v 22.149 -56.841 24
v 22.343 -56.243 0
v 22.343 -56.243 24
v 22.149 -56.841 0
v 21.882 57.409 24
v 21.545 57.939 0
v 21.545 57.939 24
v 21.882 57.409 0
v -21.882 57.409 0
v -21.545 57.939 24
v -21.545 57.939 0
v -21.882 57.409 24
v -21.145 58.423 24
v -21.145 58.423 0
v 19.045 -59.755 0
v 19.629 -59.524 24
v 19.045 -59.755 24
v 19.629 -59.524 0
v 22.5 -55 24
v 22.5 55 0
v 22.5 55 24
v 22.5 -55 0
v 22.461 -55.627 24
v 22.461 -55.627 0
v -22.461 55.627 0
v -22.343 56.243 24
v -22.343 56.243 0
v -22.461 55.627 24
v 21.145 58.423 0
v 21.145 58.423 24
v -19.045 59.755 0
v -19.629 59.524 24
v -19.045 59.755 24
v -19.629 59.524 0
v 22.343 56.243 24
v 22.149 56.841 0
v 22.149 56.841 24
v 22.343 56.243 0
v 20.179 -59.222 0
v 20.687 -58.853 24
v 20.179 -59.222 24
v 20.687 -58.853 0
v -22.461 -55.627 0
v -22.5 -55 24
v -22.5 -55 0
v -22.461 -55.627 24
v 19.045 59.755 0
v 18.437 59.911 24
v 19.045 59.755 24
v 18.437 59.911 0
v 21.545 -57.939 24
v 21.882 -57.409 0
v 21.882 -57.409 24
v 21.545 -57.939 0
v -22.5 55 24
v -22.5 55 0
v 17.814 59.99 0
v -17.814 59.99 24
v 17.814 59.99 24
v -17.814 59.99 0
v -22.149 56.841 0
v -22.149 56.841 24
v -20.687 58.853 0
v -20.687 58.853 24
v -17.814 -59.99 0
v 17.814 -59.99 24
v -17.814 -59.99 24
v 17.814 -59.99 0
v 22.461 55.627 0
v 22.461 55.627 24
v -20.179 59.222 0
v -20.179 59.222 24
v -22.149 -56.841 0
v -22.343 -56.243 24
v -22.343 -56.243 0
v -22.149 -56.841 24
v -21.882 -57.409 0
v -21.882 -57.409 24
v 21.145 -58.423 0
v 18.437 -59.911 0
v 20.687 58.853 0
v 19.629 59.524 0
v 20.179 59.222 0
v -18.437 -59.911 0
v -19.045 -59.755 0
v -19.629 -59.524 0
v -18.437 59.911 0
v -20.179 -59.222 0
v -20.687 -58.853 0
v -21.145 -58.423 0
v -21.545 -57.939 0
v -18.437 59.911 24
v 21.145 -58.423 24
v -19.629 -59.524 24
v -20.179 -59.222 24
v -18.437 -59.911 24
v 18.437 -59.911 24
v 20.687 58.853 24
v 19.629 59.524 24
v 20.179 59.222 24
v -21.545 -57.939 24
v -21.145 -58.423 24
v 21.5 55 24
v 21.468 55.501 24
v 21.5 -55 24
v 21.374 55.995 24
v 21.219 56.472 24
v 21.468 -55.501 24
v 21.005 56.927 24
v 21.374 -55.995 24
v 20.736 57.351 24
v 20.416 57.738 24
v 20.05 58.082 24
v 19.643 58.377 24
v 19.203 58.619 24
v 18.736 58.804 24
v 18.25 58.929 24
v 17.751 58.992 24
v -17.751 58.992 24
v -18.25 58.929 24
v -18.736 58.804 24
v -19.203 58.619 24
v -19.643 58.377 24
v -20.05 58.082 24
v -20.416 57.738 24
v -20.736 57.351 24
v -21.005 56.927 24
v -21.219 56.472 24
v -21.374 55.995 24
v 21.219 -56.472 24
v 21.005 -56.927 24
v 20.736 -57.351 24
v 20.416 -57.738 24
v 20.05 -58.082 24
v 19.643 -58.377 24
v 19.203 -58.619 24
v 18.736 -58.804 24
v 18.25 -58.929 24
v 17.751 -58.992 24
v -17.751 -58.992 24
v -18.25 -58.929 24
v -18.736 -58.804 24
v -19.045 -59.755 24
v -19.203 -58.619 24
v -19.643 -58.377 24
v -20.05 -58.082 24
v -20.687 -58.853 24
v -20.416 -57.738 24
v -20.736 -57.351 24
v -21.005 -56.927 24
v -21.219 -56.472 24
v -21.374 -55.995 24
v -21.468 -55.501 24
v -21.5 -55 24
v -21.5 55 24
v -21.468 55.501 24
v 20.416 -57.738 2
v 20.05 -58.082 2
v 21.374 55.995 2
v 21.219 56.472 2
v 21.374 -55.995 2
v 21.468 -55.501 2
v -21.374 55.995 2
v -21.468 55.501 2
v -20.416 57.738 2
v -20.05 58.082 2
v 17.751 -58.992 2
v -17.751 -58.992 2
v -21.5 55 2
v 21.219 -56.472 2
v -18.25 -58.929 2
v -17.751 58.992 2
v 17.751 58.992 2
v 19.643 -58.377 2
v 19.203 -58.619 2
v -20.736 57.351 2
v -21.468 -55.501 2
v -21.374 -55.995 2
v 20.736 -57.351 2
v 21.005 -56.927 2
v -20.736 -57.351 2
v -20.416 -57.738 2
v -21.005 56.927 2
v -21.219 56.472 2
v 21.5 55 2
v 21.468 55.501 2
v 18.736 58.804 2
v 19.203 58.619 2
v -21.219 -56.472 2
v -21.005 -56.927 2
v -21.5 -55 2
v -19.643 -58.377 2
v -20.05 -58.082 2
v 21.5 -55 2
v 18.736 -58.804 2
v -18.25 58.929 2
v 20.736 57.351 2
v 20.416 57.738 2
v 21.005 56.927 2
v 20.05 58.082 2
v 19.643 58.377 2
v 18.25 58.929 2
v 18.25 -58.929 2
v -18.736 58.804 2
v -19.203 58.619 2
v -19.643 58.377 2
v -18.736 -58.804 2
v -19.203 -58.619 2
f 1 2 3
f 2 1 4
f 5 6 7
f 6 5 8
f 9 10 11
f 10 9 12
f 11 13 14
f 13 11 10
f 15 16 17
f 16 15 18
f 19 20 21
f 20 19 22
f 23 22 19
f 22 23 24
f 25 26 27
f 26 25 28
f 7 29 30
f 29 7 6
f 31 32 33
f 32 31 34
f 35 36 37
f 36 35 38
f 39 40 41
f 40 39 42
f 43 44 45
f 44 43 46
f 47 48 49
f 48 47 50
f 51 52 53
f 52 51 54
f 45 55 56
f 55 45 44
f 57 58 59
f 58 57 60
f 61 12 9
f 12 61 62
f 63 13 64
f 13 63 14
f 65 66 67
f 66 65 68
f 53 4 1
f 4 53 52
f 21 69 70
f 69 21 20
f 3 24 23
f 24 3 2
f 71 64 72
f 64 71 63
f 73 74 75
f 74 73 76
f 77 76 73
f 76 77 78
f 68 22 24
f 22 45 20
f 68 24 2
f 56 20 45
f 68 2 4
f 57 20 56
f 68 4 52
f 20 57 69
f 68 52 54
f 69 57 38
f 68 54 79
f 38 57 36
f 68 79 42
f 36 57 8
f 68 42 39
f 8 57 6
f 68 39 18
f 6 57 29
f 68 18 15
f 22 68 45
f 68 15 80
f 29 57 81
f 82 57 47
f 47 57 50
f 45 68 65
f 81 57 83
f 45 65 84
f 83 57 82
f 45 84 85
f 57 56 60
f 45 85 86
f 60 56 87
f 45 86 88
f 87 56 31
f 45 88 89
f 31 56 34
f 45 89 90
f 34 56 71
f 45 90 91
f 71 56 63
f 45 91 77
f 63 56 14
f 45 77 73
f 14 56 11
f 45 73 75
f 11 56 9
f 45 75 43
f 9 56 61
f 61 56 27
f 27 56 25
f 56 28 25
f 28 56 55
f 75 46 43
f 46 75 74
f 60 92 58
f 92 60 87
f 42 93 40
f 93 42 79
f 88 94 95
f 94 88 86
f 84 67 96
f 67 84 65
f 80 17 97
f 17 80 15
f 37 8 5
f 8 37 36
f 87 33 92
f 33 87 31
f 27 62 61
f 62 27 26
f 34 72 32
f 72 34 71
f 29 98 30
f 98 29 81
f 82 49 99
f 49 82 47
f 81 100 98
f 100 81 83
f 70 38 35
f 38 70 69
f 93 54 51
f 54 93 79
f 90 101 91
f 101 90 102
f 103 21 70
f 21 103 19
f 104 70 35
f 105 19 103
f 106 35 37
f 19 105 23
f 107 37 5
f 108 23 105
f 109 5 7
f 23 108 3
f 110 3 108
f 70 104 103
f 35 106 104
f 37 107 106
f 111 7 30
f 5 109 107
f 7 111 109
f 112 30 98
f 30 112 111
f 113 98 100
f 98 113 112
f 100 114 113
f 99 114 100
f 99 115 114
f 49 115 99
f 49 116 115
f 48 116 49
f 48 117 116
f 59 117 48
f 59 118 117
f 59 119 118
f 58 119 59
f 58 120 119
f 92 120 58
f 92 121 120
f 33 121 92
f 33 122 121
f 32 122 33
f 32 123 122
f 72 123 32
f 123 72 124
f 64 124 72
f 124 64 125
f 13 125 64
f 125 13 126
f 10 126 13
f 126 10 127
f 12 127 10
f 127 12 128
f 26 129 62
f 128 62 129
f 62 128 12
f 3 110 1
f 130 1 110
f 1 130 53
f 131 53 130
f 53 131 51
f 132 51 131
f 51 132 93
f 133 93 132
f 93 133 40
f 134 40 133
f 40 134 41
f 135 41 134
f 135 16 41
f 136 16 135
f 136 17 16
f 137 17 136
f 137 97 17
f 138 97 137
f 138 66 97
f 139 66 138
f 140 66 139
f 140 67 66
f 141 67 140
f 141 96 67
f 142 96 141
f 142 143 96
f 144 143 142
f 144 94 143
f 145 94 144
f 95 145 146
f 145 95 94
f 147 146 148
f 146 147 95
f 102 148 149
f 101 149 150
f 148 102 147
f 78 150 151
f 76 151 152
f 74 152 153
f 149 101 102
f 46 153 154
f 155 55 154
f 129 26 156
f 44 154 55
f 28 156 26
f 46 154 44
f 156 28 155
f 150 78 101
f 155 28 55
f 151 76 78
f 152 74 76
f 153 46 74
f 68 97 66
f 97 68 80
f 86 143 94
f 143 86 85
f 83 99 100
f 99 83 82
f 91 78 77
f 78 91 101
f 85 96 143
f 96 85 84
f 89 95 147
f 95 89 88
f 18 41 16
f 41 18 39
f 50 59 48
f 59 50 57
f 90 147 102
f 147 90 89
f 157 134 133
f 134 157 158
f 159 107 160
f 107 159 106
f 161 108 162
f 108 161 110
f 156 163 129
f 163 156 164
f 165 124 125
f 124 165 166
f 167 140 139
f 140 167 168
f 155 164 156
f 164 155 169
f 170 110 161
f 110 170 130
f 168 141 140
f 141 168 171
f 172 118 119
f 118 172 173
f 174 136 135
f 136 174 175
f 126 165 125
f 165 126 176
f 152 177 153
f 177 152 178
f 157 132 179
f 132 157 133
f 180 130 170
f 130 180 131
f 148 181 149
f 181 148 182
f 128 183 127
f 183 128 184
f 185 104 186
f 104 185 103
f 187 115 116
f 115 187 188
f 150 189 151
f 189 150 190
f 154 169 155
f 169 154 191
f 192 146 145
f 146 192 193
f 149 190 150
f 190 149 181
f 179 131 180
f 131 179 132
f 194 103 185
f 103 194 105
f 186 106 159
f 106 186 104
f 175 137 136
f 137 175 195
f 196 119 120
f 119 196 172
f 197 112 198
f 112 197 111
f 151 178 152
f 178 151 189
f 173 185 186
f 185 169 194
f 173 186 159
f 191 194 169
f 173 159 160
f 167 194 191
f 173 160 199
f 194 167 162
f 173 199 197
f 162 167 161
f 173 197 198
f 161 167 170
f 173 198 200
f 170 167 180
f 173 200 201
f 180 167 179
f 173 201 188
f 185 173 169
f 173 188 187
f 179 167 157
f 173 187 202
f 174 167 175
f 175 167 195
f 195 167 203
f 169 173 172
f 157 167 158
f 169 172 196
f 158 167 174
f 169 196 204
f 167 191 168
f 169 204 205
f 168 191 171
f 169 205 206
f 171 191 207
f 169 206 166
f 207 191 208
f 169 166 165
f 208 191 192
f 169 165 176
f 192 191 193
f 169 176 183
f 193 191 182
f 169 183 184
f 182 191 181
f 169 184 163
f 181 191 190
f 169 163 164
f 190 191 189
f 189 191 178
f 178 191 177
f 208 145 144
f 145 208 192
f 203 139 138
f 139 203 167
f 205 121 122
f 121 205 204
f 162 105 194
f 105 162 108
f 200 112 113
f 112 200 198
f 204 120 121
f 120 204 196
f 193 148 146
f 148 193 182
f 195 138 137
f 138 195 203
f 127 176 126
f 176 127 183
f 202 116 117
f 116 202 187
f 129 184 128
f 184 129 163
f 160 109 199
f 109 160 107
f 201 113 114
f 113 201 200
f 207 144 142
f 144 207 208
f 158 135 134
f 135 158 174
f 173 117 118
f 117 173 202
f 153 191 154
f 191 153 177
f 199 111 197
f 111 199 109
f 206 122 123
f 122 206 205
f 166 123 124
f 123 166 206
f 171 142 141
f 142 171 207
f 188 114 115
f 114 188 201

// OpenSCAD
$fn = 50;


difference() {
	union() {
		hull() {
			translate(v = [-17.5000000000, 55.0000000000, 0]) {
				cylinder(h = 24, r = 5);
			}
			translate(v = [17.5000000000, 55.0000000000, 0]) {
				cylinder(h = 24, r = 5);
			}
			translate(v = [-17.5000000000, -55.0000000000, 0]) {
				cylinder(h = 24, r = 5);
			}
			translate(v = [17.5000000000, -55.0000000000, 0]) {
				cylinder(h = 24, r = 5);
			}
		}
	}
	union() {
		translate(v = [0, 0, 2]) {
			hull() {
				translate(v = [-17.5000000000, 55.0000000000, 0]) {
					cylinder(h = 22, r = 4);
				}
				translate(v = [17.5000000000, 55.0000000000, 0]) {
					cylinder(h = 22, r = 4);
				}
				translate(v = [-17.5000000000, -55.0000000000, 0]) {
					cylinder(h = 22, r = 4);
				}
				translate(v = [17.5000000000, -55.0000000000, 0]) {
					cylinder(h = 22, r = 4);
				}
			}
		}
	}
}
